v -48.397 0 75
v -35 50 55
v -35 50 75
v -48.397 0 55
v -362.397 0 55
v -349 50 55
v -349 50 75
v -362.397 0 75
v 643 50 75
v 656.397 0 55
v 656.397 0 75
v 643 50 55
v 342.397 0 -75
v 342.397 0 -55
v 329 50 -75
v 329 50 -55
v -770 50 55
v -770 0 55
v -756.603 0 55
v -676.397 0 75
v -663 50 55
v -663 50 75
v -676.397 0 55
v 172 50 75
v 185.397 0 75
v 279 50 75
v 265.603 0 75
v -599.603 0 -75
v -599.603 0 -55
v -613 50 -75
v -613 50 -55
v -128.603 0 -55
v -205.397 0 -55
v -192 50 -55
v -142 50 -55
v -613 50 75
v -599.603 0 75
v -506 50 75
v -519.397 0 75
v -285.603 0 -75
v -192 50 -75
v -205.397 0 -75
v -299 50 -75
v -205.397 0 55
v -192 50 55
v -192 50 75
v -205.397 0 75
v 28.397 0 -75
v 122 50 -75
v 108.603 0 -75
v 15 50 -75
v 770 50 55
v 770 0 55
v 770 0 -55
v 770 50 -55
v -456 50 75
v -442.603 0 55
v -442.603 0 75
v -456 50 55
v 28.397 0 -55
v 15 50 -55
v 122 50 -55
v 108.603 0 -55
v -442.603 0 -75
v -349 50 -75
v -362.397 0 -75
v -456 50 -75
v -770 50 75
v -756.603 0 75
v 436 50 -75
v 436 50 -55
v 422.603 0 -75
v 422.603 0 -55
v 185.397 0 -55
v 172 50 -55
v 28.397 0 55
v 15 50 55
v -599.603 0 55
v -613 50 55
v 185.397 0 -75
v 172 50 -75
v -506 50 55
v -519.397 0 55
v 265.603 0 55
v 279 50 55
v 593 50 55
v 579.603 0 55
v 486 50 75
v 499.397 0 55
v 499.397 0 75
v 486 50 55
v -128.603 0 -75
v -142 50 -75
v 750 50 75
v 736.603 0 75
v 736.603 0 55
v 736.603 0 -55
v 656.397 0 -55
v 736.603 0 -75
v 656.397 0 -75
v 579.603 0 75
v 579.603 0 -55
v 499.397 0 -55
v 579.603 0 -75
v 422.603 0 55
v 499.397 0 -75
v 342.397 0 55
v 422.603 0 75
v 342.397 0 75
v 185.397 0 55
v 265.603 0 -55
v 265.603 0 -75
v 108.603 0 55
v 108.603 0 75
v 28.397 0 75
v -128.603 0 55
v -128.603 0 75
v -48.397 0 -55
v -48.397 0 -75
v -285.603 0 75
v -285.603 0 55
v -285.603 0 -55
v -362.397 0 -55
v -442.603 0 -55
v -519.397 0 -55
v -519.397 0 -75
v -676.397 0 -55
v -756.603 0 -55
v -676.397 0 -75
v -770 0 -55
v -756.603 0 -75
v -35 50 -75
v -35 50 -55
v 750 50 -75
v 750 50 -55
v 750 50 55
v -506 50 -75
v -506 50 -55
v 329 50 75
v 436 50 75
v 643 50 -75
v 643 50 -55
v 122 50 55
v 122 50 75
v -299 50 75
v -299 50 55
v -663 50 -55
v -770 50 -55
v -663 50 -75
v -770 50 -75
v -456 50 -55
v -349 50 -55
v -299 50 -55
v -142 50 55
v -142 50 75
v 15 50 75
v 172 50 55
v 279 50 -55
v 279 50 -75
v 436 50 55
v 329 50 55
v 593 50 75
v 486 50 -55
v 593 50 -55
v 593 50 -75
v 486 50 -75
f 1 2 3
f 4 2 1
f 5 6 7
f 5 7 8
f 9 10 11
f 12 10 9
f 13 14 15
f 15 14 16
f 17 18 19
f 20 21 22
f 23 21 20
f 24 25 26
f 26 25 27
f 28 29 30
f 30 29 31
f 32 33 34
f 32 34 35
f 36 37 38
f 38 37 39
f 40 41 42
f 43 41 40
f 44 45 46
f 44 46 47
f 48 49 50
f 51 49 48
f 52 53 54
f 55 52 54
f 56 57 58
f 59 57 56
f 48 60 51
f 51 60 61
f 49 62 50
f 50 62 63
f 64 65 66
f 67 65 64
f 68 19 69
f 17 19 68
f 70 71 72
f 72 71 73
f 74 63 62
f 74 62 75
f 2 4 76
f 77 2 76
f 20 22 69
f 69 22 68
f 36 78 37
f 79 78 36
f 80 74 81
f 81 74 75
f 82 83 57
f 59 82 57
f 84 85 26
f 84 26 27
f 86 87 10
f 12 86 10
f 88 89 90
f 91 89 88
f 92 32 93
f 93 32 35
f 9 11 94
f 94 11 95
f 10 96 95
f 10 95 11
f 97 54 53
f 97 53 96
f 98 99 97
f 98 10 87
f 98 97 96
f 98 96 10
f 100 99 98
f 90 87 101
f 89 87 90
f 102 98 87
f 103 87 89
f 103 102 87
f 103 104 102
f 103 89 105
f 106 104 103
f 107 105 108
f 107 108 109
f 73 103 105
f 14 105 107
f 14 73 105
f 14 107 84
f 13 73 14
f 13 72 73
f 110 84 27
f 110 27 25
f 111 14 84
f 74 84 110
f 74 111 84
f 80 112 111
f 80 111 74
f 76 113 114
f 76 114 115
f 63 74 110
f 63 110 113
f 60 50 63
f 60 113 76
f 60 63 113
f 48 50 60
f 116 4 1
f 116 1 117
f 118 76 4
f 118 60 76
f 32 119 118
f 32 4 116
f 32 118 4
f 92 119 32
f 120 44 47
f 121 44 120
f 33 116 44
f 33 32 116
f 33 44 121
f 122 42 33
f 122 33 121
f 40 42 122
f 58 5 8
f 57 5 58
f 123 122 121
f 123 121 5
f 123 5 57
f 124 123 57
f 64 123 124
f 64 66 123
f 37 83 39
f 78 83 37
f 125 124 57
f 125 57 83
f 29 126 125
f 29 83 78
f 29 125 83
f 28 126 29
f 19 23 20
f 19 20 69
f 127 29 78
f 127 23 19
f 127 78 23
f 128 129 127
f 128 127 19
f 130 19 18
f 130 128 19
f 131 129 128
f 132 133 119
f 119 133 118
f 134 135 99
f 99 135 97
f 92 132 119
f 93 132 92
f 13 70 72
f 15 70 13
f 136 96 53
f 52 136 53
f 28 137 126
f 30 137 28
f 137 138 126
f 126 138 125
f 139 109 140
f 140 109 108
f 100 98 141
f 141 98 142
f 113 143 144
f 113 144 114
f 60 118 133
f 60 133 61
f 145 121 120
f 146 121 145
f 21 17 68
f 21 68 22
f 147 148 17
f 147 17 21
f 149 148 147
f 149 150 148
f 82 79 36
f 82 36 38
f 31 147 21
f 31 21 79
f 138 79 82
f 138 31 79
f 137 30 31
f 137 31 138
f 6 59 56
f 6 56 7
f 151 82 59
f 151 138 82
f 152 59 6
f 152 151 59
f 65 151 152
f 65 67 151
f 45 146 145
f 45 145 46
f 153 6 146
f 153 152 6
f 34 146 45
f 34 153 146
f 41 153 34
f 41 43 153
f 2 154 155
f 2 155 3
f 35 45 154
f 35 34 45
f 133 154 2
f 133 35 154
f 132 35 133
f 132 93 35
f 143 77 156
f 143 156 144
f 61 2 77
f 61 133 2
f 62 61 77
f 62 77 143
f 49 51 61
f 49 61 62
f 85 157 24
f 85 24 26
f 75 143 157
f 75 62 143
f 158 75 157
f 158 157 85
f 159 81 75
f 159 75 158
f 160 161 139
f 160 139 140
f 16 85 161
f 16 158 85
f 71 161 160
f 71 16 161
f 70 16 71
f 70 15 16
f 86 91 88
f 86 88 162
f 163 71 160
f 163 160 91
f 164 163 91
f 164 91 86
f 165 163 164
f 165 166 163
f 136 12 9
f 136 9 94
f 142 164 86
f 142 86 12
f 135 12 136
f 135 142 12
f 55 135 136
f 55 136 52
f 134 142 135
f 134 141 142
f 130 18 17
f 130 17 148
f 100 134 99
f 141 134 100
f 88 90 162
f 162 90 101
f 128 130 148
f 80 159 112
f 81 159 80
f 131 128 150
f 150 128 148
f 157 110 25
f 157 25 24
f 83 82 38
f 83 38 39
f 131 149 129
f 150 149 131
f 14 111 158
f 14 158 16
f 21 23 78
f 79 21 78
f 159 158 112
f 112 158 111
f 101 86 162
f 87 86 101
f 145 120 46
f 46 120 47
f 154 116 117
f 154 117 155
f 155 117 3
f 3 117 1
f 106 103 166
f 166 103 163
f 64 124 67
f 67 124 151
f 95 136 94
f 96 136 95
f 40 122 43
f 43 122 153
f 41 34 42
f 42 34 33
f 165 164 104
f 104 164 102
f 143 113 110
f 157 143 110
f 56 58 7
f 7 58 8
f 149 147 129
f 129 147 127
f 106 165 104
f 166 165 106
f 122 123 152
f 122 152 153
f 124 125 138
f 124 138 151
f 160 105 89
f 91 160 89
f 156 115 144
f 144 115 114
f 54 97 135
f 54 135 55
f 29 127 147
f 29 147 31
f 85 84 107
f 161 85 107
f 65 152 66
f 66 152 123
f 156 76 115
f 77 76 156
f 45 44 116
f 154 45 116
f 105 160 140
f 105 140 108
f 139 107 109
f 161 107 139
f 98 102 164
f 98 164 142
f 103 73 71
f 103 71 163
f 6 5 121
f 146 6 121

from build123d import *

# Parameters (mm, degrees)
SKETCH2_W            = 1540
SKETCH2_H            = 110
BOSS_EXTRUDE1_DEPTH  = 50
BOSS_EXTRUDE3_DEPTH  = 20
LPATTERN1_COUNT      = 10
LPATTERN1_PITCH      = 157
MIRROR2_COPY_1_DEPTH = 20
MIRROR2_COPY_2_DEPTH = 20
MIRROR2_COPY_3_DEPTH = 20
MIRROR2_COPY_4_DEPTH = 20
MIRROR2_COPY_5_DEPTH = 20
MIRROR2_COPY_6_DEPTH = 20
MIRROR2_COPY_7_DEPTH = 20
MIRROR2_COPY_8_DEPTH = 20
MIRROR2_COPY_9_DEPTH = 20


with BuildPart() as part:
    # Sketch2 → Boss-Extrude1 (new body)
    with BuildSketch(Plane(origin=(0, 0, 0), x_dir=(1, 0, 0), z_dir=(0, 1, 0))):
        Rectangle(SKETCH2_W, SKETCH2_H)
    extrude(amount=BOSS_EXTRUDE1_DEPTH)

    # Sketch4 → Boss-Extrude3 (add)
    with BuildSketch(Plane(origin=(0, 0, -55), x_dir=(-1, 0, 0), z_dir=(0, 0, -1))):
        Polygon((663, 50), (676.397459622, 0), (756.602540378, 0), (770, 50), align=None)
    boss_extrude3 = extrude(amount=BOSS_EXTRUDE3_DEPTH)

    # LPattern1: Boss-Extrude3 ×10
    with Locations(*[(i * LPATTERN1_PITCH, 0, 0) for i in range(1, LPATTERN1_COUNT)]):
        add(boss_extrude3)

    # Mirror2: Boss-Extrude3 across plane
    add(boss_extrude3.mirror(Plane(origin=(0, 0, 0), x_dir=(1, 0, 0), z_dir=(0, 0, -1))))

    # Mirror2 copy 1 sketch → Mirror2 copy 1 (add)
    with BuildSketch(Plane(origin=(157, 0, 55), x_dir=(-1, 0, 0), z_dir=(0, 0, 1))):
        Polygon((663, -50), (676.397459622, 0), (756.602540378, 0), (770, -50), align=None)
    extrude(amount=MIRROR2_COPY_1_DEPTH)

    # Mirror2 copy 2 sketch → Mirror2 copy 2 (add)
    with BuildSketch(Plane(origin=(314, 0, 55), x_dir=(-1, 0, 0), z_dir=(0, 0, 1))):
        Polygon((663, -50), (676.397459622, 0), (756.602540378, 0), (770, -50), align=None)
    extrude(amount=MIRROR2_COPY_2_DEPTH)

    # Mirror2 copy 3 sketch → Mirror2 copy 3 (add)
    with BuildSketch(Plane(origin=(471, 0, 55), x_dir=(-1, 0, 0), z_dir=(0, 0, 1))):
        Polygon((663, -50), (676.397459622, 0), (756.602540378, 0), (770, -50), align=None)
    extrude(amount=MIRROR2_COPY_3_DEPTH)

    # Mirror2 copy 4 sketch → Mirror2 copy 4 (add)
    with BuildSketch(Plane(origin=(628, 0, 55), x_dir=(-1, 0, 0), z_dir=(0, 0, 1))):
        Polygon((663, -50), (676.397459622, 0), (756.602540378, 0), (770, -50), align=None)
    extrude(amount=MIRROR2_COPY_4_DEPTH)

    # Mirror2 copy 5 sketch → Mirror2 copy 5 (add)
    with BuildSketch(Plane(origin=(785, 0, 55), x_dir=(-1, 0, 0), z_dir=(0, 0, 1))):
        Polygon((663, -50), (676.397459622, 0), (756.602540378, 0), (770, -50), align=None)
    extrude(amount=MIRROR2_COPY_5_DEPTH)

    # Mirror2 copy 6 sketch → Mirror2 copy 6 (add)
    with BuildSketch(Plane(origin=(942, 0, 55), x_dir=(-1, 0, 0), z_dir=(0, 0, 1))):
        Polygon((663, -50), (676.397459622, 0), (756.602540378, 0), (770, -50), align=None)
    extrude(amount=MIRROR2_COPY_6_DEPTH)

    # Mirror2 copy 7 sketch → Mirror2 copy 7 (add)
    with BuildSketch(Plane(origin=(1099, 0, 55), x_dir=(-1, 0, 0), z_dir=(0, 0, 1))):
        Polygon((663, -50), (676.397459622, 0), (756.602540378, 0), (770, -50), align=None)
    extrude(amount=MIRROR2_COPY_7_DEPTH)

    # Mirror2 copy 8 sketch → Mirror2 copy 8 (add)
    with BuildSketch(Plane(origin=(1256, 0, 55), x_dir=(-1, 0, 0), z_dir=(0, 0, 1))):
        Polygon((663, -50), (676.397459622, 0), (756.602540378, 0), (770, -50), align=None)
    extrude(amount=MIRROR2_COPY_8_DEPTH)

    # Mirror2 copy 9 sketch → Mirror2 copy 9 (add)
    with BuildSketch(Plane(origin=(1413, 0, 55), x_dir=(-1, 0, 0), z_dir=(0, 0, 1))):
        Polygon((663, -50), (676.397459622, 0), (756.602540378, 0), (770, -50), align=None)
    extrude(amount=MIRROR2_COPY_9_DEPTH)


solid = part.part
